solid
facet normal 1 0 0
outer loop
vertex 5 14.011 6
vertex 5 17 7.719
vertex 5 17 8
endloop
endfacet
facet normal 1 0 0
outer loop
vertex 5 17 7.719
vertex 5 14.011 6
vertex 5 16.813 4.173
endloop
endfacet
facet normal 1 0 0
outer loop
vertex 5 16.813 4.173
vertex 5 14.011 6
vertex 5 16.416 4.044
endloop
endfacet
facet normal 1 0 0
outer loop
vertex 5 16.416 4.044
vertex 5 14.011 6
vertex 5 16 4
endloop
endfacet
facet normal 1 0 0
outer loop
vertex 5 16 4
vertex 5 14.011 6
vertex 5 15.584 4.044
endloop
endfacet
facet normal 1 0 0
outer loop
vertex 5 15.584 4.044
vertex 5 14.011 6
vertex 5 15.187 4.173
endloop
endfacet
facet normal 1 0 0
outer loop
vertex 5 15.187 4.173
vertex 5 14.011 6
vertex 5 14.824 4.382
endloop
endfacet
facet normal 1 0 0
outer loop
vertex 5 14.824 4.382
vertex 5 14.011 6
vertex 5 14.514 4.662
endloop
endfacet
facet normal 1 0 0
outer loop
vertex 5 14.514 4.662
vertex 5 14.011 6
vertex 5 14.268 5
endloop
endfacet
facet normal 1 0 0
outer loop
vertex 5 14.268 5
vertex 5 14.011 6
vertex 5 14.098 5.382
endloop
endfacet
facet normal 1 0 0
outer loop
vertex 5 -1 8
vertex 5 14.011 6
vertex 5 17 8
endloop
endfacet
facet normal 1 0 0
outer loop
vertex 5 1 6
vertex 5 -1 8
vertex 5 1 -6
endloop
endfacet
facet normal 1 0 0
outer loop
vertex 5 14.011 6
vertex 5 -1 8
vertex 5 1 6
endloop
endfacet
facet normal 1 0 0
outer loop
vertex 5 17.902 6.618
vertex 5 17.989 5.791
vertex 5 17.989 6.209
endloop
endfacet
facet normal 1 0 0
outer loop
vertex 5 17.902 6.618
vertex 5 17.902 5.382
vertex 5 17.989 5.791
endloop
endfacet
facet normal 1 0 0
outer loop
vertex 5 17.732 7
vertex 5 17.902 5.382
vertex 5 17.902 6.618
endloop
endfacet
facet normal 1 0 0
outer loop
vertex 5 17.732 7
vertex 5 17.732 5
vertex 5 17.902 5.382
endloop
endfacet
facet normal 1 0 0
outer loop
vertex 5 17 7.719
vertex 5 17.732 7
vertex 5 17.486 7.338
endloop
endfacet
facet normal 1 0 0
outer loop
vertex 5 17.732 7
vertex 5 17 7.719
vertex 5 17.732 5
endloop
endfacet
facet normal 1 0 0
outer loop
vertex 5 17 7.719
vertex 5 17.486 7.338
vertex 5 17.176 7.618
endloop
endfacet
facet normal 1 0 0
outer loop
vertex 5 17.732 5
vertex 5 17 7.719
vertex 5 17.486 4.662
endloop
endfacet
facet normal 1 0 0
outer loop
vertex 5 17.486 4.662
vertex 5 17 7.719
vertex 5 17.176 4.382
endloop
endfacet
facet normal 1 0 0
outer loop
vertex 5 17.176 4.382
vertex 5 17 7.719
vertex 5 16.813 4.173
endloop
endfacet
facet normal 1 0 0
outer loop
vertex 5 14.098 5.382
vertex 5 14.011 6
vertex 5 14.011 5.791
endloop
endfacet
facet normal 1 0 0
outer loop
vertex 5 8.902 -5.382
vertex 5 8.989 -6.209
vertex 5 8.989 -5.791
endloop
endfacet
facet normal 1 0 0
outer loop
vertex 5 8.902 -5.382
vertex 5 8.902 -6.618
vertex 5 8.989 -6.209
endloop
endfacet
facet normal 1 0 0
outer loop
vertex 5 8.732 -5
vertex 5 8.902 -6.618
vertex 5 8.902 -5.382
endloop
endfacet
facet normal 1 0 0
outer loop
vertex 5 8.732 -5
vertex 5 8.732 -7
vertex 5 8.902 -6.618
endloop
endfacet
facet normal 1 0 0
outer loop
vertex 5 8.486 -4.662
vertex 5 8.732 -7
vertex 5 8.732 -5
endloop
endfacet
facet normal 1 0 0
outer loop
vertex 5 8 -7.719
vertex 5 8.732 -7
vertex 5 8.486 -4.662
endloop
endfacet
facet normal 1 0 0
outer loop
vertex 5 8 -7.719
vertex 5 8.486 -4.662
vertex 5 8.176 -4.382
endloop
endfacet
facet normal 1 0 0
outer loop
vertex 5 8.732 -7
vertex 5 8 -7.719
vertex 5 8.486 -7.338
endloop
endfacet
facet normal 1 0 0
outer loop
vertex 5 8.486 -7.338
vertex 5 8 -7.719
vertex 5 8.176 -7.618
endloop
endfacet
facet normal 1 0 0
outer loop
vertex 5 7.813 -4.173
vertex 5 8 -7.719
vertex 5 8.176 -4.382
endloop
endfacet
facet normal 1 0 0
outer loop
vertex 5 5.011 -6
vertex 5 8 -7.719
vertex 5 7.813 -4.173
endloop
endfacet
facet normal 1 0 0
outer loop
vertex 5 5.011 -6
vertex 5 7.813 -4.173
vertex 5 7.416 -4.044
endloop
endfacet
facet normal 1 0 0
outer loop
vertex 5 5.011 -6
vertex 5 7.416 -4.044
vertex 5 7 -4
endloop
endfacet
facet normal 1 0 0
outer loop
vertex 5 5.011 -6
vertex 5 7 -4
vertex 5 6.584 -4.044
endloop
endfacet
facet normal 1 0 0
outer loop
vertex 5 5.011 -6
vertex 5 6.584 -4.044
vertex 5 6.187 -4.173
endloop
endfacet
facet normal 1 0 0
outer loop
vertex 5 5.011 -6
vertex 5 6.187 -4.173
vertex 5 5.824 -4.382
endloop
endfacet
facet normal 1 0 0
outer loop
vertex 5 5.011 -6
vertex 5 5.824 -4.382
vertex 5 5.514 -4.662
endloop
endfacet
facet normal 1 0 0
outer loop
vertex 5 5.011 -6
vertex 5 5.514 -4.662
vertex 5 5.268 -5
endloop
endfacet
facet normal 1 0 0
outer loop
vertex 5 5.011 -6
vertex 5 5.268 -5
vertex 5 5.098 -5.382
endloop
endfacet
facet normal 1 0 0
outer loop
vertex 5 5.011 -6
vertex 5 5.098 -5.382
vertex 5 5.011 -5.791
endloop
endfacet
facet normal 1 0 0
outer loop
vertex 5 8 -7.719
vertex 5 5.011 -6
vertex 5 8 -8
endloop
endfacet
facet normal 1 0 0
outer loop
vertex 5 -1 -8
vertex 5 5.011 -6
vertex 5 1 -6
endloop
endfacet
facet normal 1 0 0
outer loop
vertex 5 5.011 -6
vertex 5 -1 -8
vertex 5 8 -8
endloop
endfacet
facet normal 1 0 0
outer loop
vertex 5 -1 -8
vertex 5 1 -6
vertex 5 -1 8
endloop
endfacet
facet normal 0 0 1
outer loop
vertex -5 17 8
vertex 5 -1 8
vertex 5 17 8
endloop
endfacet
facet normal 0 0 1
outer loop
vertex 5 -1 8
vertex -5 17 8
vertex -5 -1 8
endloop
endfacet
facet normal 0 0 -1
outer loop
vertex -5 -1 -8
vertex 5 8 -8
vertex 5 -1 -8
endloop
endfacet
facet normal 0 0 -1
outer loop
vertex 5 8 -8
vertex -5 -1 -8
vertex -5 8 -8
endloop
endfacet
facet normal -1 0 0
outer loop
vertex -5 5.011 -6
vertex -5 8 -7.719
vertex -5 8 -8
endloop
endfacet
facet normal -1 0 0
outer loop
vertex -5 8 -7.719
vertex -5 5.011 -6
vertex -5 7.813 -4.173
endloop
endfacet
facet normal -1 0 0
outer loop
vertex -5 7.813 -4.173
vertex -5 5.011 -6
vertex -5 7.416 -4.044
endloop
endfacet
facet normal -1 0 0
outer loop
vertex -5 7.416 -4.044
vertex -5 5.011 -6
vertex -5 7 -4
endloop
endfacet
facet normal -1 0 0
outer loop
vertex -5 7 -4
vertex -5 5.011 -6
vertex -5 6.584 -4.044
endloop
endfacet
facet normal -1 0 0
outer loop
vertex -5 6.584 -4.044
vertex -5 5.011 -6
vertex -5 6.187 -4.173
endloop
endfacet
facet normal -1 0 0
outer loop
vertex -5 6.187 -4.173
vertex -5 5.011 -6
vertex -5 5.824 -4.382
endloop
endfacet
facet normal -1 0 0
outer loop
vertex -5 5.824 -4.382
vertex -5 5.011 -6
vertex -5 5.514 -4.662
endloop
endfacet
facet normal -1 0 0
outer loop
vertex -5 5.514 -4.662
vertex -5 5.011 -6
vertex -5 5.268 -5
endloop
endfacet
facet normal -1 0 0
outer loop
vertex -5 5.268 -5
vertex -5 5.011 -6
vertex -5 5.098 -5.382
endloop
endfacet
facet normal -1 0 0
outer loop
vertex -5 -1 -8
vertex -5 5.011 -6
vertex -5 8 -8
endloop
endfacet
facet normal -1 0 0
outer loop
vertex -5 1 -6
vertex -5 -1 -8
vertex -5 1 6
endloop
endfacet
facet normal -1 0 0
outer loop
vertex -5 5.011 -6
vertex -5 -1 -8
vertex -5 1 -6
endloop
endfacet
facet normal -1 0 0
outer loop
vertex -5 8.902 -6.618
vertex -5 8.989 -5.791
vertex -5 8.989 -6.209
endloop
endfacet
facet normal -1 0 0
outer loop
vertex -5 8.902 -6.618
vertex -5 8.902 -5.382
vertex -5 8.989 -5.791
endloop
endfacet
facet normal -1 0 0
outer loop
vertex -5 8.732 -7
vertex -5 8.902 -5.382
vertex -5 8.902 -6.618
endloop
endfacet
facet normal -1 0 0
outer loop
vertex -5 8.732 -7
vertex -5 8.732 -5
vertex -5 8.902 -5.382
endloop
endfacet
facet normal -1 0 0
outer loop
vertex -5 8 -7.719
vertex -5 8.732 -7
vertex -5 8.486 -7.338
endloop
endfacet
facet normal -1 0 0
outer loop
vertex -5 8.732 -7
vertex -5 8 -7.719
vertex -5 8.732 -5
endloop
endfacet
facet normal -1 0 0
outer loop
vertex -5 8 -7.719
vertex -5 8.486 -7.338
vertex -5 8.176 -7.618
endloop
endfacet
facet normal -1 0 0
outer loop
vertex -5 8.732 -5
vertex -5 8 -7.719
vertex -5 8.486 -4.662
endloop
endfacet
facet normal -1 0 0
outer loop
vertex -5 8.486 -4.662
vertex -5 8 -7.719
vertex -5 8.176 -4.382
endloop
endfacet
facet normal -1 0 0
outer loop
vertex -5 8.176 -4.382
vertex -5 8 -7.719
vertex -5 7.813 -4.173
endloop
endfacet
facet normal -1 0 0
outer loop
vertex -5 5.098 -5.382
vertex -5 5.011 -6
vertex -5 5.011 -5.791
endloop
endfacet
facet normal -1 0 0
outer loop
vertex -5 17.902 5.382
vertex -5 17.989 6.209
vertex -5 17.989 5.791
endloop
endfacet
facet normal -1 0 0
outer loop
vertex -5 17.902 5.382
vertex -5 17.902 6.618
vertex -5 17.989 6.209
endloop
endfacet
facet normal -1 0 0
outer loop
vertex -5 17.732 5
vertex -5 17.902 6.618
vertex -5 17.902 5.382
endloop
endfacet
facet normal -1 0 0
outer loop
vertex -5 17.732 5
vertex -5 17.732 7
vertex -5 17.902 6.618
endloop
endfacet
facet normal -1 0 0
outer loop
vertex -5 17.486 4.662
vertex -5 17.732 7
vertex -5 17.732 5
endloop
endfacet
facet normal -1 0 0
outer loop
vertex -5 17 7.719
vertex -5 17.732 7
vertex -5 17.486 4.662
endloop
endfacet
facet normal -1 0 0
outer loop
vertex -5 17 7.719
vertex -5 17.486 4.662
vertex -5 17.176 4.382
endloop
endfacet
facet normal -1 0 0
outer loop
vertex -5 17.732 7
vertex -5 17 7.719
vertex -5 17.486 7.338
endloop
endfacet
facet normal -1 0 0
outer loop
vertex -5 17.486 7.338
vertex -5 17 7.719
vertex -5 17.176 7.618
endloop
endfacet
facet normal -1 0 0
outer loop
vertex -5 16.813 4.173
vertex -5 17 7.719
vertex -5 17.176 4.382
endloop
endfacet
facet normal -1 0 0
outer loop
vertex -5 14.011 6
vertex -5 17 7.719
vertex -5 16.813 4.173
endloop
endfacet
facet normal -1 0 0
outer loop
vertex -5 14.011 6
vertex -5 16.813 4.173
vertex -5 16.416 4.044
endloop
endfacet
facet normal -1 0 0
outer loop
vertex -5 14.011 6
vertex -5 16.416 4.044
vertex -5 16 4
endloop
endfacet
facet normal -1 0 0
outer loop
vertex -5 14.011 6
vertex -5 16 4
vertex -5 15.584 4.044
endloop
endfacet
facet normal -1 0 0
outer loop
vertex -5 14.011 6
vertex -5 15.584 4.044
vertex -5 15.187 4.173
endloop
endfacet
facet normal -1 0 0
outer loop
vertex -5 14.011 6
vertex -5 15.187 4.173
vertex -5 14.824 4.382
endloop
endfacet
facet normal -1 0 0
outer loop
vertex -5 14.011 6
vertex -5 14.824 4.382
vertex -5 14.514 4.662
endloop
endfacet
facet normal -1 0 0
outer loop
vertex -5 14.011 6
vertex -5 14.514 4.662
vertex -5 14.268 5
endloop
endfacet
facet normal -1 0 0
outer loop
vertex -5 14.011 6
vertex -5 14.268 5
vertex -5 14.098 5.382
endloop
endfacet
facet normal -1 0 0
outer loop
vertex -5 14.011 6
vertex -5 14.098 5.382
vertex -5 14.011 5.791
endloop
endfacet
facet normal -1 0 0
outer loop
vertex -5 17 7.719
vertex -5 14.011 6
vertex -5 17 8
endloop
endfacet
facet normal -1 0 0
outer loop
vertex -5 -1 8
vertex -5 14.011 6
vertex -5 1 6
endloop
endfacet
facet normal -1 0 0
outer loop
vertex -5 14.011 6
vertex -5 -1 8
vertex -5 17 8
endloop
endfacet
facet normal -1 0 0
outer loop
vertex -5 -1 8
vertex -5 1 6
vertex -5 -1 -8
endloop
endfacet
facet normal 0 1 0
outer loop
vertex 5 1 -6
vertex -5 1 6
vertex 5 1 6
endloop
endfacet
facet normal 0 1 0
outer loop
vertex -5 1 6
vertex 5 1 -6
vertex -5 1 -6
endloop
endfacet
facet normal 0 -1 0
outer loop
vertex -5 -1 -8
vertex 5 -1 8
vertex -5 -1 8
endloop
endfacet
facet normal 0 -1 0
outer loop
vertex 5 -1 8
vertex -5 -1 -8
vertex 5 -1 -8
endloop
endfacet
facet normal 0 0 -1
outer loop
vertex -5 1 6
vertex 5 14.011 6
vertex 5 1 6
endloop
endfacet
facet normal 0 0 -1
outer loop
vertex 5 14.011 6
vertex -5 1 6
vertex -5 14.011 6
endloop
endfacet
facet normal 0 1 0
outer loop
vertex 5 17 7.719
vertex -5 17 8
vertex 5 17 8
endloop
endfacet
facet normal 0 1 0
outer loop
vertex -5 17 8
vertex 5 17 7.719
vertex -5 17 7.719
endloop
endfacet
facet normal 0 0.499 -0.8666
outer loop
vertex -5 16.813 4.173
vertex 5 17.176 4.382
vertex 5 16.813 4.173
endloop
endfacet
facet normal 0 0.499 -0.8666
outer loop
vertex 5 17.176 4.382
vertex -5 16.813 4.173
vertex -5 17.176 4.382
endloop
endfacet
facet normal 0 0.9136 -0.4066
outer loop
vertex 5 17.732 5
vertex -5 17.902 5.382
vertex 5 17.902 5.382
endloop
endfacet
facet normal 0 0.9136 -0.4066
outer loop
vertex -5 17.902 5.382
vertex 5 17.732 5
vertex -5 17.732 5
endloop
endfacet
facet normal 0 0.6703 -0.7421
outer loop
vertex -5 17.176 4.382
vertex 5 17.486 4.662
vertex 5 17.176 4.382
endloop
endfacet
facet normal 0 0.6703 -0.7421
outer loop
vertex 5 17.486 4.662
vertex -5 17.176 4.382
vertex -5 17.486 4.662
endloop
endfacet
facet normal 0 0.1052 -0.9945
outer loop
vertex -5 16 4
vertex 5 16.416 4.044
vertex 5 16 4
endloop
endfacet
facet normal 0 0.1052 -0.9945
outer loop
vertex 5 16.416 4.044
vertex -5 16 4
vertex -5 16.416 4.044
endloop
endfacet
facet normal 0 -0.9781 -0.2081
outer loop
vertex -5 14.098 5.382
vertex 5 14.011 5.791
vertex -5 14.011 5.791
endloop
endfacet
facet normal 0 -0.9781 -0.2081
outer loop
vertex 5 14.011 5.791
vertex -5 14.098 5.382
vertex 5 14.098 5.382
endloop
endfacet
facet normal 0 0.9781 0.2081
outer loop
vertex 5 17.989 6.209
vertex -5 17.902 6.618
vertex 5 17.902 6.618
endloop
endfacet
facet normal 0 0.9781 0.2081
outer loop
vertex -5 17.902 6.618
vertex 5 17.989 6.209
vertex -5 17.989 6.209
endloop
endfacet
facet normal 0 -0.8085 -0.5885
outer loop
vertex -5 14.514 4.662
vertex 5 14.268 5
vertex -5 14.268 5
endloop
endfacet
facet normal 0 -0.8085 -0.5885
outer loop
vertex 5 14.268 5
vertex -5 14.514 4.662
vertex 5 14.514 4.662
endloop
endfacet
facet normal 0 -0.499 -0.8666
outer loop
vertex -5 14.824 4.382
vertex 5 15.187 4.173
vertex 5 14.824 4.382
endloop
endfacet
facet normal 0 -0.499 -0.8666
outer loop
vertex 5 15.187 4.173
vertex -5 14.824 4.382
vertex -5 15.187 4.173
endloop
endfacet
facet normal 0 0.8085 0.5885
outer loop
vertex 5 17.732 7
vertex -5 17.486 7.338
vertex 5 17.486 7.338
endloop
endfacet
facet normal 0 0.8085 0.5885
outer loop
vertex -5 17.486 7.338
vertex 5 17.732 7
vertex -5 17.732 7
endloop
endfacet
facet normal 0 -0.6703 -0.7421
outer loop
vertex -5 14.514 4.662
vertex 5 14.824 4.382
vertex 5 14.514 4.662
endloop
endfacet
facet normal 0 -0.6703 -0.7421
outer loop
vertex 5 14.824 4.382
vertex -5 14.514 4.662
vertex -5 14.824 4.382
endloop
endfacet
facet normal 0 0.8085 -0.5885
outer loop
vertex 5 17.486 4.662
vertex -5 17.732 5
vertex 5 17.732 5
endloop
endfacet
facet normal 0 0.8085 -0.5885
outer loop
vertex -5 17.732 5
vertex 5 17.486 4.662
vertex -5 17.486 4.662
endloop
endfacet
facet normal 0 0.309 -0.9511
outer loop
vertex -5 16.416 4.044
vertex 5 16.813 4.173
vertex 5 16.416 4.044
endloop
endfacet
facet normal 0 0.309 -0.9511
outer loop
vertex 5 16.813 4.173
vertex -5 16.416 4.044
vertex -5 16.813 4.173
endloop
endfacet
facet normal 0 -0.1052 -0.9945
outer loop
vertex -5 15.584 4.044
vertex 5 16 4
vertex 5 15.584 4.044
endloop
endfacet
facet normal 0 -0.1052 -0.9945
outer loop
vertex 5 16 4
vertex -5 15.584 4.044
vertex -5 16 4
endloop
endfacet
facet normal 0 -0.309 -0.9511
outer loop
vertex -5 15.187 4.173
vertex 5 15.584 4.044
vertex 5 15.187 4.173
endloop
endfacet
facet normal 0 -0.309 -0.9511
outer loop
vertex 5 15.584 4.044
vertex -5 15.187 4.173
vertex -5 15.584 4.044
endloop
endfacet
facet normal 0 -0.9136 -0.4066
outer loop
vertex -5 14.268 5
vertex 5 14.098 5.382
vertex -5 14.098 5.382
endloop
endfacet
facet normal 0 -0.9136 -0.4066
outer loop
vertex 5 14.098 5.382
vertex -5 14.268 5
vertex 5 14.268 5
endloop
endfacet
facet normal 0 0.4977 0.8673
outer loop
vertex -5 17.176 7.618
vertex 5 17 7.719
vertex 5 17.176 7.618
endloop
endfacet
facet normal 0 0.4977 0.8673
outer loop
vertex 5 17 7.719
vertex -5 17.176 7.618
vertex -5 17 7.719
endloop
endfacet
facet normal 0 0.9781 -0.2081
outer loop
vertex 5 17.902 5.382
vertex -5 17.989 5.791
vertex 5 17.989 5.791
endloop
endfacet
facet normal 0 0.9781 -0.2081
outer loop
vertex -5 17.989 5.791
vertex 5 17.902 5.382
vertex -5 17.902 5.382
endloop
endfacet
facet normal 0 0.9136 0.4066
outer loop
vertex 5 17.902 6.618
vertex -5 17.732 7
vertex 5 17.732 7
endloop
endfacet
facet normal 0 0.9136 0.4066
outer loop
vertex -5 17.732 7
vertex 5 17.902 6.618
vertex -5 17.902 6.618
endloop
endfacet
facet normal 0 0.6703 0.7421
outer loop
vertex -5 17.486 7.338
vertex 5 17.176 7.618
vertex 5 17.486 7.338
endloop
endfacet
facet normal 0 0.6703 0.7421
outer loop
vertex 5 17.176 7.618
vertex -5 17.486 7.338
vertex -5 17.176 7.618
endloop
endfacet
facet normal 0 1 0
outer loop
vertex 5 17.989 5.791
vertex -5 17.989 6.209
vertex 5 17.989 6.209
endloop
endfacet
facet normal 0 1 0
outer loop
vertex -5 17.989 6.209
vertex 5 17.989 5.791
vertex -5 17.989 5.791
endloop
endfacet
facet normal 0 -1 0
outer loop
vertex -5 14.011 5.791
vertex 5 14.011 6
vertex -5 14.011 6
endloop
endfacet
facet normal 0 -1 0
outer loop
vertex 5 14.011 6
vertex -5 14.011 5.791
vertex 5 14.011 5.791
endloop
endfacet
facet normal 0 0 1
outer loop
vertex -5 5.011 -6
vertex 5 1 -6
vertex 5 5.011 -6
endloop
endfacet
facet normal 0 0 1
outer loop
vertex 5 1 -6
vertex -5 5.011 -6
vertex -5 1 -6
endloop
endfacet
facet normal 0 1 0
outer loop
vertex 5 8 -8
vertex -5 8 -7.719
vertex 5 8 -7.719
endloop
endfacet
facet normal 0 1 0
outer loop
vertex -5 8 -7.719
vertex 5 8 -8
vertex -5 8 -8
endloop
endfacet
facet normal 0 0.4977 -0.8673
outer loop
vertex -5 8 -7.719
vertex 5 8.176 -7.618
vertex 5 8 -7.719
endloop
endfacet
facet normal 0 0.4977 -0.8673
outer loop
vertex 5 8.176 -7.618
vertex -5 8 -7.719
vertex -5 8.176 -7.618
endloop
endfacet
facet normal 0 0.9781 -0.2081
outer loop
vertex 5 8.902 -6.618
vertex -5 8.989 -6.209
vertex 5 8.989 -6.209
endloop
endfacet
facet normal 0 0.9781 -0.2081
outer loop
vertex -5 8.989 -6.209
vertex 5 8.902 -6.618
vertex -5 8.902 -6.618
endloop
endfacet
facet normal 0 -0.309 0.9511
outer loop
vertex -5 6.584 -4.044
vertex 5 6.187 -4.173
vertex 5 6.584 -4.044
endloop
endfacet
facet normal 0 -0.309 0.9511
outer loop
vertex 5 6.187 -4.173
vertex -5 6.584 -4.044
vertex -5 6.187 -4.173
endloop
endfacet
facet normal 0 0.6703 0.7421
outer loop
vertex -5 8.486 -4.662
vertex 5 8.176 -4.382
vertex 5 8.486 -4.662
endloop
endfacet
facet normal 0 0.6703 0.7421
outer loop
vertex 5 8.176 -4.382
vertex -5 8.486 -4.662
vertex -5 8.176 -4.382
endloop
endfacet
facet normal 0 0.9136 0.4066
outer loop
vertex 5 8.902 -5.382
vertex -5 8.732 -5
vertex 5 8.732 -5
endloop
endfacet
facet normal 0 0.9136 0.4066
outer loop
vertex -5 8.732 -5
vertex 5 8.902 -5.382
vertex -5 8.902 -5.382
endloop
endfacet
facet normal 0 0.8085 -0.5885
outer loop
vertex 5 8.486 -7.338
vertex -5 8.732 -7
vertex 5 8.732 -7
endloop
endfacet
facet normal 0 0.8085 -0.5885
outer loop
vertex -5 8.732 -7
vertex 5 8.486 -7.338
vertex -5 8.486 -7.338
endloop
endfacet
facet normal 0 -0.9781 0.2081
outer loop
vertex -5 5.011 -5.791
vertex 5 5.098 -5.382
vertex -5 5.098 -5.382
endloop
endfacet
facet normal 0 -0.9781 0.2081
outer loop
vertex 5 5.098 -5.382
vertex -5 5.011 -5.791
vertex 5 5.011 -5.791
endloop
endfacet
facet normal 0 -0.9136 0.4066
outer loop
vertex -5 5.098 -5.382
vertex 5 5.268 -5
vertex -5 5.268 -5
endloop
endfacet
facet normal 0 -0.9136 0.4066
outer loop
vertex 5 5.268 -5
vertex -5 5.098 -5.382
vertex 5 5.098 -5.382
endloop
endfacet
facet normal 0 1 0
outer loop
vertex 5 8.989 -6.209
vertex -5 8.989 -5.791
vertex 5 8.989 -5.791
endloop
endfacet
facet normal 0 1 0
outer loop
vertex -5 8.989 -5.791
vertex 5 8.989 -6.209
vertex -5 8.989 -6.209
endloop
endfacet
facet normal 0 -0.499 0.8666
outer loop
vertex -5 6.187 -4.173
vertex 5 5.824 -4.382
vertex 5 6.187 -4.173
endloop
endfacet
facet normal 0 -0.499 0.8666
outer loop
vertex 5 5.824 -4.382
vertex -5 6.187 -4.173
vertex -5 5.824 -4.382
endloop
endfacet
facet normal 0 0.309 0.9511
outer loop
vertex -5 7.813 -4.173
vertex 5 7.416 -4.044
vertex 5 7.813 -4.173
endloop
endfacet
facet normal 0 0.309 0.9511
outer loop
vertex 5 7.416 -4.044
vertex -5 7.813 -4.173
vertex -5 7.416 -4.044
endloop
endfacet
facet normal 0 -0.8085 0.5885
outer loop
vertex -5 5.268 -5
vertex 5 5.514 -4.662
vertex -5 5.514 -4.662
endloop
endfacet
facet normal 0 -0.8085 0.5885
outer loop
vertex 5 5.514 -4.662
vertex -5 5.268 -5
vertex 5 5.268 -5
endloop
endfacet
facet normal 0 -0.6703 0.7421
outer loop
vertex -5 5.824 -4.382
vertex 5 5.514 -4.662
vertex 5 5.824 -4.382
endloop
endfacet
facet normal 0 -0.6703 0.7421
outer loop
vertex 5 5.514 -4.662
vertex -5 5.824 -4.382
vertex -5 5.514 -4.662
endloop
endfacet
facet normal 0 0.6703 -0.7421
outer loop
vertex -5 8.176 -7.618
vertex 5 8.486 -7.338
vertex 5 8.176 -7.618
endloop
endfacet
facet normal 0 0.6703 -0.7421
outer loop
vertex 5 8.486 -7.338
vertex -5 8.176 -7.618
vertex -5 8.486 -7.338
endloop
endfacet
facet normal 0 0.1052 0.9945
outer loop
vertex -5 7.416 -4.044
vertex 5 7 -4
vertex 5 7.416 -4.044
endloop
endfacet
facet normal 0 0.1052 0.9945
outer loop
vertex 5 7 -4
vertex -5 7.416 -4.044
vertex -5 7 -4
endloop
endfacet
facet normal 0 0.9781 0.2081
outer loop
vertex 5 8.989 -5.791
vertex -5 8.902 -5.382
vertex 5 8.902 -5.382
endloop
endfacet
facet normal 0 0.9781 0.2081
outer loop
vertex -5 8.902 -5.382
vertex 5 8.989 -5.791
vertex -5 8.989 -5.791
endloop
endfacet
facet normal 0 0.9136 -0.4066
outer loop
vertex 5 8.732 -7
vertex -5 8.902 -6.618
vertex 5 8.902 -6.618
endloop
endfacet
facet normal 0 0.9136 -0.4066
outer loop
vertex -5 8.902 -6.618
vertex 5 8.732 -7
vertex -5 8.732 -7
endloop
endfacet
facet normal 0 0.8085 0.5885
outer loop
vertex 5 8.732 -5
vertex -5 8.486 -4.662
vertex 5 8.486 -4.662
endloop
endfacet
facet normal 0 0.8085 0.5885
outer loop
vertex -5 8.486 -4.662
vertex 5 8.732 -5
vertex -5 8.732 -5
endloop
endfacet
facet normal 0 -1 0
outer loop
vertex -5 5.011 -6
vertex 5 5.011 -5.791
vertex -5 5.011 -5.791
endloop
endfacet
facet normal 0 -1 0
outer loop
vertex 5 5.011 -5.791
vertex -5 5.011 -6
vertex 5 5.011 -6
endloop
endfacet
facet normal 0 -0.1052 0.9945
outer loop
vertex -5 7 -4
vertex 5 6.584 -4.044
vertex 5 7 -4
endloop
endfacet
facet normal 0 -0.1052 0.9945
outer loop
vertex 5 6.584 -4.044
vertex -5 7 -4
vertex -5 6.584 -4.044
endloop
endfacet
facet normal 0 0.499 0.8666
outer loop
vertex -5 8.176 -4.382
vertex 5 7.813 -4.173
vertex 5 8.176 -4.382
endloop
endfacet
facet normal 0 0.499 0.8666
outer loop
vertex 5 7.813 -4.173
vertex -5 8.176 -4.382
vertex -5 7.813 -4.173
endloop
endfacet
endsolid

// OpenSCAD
THICKNESS = 2;

HEIGHT = 12;
DEPTH_TOP = 12;
DEPTH_BOT = 3;
LIP_DIA = 4;
WIDTH = 10;

$fn = 30;

module clip() {
  union() {
    cube(size = [WIDTH, THICKNESS, HEIGHT + 2 * THICKNESS], center = true);
    translate([0, (DEPTH_TOP + LIP_DIA + THICKNESS)/2, (HEIGHT + THICKNESS)/2])
    cube(size = [WIDTH, DEPTH_TOP + LIP_DIA , THICKNESS], center = true);

    translate([0, (DEPTH_TOP + LIP_DIA), HEIGHT/2])
    rotate([0, 90, 0])
    cylinder(d = LIP_DIA, h = WIDTH, center = true);

    translate([0, (DEPTH_BOT + LIP_DIA + THICKNESS)/2, -(HEIGHT + THICKNESS)/2])
    cube(size = [WIDTH, DEPTH_BOT + LIP_DIA , THICKNESS], center = true);

    translate([0, (DEPTH_BOT + LIP_DIA), -HEIGHT/2])
    rotate([0, 90, 0])
    cylinder(d = LIP_DIA, h = WIDTH, center = true);
  }
}

clip();
